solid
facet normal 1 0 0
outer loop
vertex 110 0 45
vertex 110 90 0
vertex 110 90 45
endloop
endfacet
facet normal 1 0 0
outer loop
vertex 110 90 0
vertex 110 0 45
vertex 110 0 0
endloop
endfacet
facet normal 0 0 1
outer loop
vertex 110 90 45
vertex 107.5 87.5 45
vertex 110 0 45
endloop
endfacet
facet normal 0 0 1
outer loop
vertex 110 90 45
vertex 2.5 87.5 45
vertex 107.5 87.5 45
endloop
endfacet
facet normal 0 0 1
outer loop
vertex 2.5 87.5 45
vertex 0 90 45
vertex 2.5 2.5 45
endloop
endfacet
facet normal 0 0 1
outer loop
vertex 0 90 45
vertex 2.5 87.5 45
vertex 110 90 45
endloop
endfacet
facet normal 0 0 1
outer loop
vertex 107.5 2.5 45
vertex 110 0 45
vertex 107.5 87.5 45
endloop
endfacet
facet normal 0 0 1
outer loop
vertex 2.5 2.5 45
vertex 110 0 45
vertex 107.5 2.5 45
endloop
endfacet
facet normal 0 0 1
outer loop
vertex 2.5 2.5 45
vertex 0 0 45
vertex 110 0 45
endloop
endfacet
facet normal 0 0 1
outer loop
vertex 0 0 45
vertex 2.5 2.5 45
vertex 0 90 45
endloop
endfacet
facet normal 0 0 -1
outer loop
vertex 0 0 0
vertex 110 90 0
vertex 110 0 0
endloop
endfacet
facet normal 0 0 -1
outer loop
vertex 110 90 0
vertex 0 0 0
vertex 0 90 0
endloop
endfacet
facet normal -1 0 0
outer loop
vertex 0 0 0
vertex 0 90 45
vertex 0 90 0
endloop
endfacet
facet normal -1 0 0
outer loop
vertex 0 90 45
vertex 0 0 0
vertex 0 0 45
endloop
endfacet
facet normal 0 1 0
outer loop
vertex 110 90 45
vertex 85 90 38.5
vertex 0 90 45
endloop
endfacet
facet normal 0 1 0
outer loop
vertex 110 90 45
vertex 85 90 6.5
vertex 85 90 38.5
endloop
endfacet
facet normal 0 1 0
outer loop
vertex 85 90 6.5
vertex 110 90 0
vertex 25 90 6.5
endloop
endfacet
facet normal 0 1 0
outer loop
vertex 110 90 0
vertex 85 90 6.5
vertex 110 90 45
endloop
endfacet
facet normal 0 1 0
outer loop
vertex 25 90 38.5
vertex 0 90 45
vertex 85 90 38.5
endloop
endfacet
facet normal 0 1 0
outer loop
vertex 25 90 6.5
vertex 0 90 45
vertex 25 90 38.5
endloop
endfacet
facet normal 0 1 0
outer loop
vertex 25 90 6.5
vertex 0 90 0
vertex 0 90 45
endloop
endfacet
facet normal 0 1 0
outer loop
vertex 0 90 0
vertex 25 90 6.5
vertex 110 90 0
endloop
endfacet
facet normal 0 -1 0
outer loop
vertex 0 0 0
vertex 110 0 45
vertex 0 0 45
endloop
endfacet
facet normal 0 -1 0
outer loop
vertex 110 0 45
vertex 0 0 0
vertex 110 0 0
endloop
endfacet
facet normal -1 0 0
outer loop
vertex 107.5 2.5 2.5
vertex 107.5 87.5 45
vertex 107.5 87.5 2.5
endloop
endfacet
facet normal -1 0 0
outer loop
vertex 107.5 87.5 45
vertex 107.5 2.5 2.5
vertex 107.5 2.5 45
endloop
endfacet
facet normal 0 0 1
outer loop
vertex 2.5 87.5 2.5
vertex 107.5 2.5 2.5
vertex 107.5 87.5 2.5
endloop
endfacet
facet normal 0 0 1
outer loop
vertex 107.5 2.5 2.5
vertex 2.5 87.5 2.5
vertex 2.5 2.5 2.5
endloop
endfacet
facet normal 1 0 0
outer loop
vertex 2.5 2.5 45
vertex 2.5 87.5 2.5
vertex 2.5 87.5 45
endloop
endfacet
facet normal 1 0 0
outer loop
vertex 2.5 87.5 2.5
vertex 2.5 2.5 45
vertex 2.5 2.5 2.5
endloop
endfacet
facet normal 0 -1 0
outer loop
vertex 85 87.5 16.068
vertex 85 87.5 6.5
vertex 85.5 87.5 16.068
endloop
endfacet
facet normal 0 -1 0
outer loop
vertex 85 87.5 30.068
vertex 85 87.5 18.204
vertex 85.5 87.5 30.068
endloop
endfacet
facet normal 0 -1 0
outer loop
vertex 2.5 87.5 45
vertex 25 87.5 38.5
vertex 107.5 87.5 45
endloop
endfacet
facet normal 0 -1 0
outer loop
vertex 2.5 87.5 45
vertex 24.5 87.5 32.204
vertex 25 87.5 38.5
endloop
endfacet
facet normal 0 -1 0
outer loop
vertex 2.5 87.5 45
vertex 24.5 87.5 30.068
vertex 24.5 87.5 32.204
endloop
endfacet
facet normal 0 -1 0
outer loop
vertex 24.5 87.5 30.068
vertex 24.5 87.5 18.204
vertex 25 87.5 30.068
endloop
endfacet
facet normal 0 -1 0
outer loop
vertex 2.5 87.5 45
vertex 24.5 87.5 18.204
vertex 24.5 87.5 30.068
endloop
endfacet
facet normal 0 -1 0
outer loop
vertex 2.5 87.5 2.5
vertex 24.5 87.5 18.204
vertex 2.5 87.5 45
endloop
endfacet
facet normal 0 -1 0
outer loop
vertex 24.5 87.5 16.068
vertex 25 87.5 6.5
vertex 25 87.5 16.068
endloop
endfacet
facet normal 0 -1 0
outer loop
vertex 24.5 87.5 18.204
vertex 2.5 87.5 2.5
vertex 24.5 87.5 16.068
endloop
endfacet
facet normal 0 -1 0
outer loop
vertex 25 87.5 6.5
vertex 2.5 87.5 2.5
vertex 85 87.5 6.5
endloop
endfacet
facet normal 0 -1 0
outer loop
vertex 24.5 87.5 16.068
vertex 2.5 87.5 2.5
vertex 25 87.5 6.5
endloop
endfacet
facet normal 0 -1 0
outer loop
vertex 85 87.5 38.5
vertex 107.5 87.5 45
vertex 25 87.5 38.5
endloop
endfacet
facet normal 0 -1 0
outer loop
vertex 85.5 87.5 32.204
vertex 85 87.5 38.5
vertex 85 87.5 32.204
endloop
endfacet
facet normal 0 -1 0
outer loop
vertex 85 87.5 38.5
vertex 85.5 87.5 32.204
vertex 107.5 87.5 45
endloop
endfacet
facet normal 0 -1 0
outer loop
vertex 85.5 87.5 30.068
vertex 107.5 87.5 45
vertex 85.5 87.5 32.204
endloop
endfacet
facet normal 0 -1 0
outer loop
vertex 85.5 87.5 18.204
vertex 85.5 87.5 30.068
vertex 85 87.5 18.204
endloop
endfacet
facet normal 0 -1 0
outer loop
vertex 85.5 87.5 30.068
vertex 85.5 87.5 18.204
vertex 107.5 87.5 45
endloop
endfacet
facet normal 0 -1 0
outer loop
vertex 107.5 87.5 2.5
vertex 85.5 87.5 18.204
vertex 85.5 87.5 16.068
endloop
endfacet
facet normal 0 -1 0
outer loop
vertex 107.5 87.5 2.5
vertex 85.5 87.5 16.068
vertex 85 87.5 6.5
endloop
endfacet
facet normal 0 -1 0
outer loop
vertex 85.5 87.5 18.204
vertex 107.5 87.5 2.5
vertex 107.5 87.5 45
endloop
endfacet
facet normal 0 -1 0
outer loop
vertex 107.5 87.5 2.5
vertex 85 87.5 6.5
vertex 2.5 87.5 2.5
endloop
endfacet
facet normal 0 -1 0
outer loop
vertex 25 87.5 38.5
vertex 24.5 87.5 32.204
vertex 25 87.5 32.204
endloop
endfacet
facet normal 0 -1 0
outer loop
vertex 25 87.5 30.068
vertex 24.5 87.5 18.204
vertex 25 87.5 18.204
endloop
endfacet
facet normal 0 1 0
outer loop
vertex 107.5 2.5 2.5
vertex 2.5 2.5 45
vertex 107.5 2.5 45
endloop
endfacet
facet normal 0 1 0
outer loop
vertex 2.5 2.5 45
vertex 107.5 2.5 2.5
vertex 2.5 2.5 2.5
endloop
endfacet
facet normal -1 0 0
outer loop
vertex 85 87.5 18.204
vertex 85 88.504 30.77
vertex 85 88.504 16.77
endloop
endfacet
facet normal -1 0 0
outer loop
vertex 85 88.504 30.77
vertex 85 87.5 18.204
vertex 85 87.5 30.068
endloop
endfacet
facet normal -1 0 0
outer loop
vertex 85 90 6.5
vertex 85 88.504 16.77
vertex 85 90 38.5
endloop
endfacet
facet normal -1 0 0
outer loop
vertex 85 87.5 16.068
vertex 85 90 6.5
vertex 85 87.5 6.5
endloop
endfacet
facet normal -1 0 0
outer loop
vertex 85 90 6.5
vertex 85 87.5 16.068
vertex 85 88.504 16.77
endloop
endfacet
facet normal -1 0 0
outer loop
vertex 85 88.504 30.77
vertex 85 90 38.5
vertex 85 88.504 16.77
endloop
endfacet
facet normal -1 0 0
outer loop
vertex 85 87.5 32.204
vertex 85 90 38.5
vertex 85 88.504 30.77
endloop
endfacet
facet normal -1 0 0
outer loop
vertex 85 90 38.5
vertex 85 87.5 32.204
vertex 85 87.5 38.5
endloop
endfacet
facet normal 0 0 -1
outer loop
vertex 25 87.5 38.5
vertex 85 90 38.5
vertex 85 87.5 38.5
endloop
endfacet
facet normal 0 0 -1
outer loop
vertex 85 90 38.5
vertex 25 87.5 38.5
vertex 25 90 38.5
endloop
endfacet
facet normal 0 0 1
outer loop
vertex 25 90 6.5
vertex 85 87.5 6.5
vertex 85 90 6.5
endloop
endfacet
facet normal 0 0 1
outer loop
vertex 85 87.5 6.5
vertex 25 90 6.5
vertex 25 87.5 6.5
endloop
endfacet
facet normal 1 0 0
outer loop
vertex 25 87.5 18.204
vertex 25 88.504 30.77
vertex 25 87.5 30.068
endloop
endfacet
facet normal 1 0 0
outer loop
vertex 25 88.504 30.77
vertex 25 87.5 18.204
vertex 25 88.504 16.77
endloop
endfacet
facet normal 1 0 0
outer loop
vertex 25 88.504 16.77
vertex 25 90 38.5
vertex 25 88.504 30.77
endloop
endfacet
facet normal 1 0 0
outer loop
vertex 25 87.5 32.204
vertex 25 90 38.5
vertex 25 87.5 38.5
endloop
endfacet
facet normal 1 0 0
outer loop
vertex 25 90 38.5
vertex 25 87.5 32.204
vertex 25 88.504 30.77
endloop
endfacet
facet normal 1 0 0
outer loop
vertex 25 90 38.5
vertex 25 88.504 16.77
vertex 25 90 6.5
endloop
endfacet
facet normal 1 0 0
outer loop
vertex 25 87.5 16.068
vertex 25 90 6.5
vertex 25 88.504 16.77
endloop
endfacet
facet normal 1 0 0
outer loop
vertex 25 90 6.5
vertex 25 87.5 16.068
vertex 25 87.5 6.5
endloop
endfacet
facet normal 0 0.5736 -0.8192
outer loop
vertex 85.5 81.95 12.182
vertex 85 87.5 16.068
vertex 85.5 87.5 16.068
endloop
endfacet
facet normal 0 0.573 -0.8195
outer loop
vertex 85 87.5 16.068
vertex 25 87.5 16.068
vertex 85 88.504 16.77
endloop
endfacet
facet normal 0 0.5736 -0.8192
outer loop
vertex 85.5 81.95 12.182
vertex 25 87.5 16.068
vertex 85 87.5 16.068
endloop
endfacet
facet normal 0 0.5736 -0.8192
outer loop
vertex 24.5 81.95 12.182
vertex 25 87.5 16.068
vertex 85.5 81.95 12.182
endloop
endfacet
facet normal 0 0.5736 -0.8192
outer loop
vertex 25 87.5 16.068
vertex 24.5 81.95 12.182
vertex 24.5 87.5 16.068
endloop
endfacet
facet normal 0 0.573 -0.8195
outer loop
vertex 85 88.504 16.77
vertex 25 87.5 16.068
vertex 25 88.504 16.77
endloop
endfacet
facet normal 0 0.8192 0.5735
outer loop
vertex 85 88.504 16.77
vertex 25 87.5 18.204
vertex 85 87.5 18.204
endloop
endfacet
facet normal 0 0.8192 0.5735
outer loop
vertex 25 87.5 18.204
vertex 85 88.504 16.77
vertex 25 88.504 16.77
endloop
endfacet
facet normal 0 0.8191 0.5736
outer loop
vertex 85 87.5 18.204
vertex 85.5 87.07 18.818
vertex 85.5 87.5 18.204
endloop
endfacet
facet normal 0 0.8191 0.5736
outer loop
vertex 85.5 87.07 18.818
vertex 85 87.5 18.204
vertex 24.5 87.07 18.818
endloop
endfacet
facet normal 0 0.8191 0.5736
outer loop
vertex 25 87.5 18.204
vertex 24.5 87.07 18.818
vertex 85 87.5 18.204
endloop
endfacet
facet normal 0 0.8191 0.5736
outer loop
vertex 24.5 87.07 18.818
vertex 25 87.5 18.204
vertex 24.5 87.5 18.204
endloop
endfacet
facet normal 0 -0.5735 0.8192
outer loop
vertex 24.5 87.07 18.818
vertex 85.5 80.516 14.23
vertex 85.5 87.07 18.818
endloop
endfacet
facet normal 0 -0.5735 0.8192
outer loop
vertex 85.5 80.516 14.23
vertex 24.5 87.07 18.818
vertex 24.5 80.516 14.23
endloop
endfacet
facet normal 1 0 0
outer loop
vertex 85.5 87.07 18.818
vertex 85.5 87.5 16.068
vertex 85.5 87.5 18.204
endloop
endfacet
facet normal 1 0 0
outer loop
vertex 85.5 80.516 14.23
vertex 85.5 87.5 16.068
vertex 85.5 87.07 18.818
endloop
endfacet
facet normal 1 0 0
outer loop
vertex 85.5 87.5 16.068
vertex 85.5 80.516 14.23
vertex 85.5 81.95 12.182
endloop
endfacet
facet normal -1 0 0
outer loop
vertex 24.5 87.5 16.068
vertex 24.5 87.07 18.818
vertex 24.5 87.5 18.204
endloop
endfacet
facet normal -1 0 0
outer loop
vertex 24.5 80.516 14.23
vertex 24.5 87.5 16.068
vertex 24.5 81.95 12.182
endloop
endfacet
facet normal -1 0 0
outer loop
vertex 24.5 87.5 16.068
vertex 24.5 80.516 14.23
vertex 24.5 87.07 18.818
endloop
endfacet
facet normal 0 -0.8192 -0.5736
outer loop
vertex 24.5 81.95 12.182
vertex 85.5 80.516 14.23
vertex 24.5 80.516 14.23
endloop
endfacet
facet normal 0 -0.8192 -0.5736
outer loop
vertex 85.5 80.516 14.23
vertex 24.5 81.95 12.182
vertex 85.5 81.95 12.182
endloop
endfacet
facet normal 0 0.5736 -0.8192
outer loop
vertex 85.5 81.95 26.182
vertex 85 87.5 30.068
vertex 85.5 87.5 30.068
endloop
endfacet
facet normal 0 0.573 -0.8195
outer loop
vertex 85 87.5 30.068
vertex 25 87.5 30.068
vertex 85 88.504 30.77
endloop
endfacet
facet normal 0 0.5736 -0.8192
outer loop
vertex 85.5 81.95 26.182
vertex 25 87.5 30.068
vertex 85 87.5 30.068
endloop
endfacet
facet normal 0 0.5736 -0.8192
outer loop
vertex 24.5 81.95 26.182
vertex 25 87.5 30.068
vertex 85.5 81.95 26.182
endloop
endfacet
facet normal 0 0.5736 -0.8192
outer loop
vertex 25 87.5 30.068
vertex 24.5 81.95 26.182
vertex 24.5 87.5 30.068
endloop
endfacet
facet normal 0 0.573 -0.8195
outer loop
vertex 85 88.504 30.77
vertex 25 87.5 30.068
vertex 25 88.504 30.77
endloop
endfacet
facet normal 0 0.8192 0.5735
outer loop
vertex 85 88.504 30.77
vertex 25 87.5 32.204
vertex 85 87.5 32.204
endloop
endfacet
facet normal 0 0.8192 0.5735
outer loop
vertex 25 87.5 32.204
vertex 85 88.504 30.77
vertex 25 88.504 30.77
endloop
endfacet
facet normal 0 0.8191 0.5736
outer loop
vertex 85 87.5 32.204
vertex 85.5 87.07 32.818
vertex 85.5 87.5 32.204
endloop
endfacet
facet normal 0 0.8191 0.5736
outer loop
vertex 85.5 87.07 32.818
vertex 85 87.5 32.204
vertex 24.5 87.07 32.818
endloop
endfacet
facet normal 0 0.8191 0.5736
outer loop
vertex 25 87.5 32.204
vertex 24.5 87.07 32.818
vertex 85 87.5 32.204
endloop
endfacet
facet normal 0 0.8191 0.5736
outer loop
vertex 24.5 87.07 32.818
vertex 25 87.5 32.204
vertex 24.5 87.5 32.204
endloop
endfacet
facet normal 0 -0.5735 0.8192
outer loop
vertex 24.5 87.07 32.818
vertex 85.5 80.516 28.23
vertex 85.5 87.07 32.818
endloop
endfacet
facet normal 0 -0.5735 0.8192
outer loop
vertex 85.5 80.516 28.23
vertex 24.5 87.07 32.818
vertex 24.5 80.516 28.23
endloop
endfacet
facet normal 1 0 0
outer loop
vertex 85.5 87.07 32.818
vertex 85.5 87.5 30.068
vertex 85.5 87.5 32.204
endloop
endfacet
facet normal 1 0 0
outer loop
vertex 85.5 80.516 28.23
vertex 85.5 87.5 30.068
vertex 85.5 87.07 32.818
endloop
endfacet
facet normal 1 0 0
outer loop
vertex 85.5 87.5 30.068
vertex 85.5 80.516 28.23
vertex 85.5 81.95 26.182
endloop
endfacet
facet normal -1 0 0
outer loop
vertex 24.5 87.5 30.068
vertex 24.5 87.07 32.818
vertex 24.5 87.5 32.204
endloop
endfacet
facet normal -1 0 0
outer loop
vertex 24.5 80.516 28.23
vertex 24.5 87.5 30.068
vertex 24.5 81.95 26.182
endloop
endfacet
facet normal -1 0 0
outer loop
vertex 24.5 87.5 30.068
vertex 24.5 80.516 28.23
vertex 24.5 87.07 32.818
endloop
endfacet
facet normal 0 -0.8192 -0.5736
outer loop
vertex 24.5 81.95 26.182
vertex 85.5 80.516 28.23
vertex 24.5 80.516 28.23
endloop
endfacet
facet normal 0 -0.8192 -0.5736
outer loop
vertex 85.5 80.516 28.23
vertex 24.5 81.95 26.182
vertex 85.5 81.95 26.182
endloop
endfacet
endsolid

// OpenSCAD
$fn = 32;

// ----------------------------------------------------------------------
// Vent box: louvers enclosure
// ----------------------------------------------------------------------

// --- parameters (mm) ---
box_l = 110;              // box length, X
box_w = 90;               // box width, Y
box_h = 45;               // box height, Z
wall_t = 2.5;             // shell wall thickness
win_l = 60;               // vent window width, X
win_h = 32;               // vent window height, Z
slat_t = 2.5;             // louver slat thickness
slat_d = 8;               // louver slat depth
slat_a = 35;              // louver slat angle, degrees
slat_pitch = 14;          // louver pitch
slat_yc = 84.51;          // slat centreline Y

win_z0 = (box_h - win_h) / 2;  // window lower edge Z
n_slats = 2;  // louver count
slat_z0 = win_z0 + (win_h - (n_slats - 1) * slat_pitch) / 2;

difference() {
  union() {
    difference() {
      cube([box_l, box_w, box_h]);
  translate([wall_t, wall_t, wall_t])
    cube([box_l - 2 * wall_t, box_w - 2 * wall_t, box_h]);
  translate([(box_l - win_l) / 2, box_w - wall_t - 1, win_z0])
    cube([win_l, wall_t + 2, win_h]);
    }
    for (i = [0 : n_slats - 1])
      translate([box_l / 2, slat_yc, slat_z0 + i * slat_pitch])
        rotate([slat_a, 0, 0])
          cube([win_l + 1, slat_d, slat_t], center = true);
  }
}
